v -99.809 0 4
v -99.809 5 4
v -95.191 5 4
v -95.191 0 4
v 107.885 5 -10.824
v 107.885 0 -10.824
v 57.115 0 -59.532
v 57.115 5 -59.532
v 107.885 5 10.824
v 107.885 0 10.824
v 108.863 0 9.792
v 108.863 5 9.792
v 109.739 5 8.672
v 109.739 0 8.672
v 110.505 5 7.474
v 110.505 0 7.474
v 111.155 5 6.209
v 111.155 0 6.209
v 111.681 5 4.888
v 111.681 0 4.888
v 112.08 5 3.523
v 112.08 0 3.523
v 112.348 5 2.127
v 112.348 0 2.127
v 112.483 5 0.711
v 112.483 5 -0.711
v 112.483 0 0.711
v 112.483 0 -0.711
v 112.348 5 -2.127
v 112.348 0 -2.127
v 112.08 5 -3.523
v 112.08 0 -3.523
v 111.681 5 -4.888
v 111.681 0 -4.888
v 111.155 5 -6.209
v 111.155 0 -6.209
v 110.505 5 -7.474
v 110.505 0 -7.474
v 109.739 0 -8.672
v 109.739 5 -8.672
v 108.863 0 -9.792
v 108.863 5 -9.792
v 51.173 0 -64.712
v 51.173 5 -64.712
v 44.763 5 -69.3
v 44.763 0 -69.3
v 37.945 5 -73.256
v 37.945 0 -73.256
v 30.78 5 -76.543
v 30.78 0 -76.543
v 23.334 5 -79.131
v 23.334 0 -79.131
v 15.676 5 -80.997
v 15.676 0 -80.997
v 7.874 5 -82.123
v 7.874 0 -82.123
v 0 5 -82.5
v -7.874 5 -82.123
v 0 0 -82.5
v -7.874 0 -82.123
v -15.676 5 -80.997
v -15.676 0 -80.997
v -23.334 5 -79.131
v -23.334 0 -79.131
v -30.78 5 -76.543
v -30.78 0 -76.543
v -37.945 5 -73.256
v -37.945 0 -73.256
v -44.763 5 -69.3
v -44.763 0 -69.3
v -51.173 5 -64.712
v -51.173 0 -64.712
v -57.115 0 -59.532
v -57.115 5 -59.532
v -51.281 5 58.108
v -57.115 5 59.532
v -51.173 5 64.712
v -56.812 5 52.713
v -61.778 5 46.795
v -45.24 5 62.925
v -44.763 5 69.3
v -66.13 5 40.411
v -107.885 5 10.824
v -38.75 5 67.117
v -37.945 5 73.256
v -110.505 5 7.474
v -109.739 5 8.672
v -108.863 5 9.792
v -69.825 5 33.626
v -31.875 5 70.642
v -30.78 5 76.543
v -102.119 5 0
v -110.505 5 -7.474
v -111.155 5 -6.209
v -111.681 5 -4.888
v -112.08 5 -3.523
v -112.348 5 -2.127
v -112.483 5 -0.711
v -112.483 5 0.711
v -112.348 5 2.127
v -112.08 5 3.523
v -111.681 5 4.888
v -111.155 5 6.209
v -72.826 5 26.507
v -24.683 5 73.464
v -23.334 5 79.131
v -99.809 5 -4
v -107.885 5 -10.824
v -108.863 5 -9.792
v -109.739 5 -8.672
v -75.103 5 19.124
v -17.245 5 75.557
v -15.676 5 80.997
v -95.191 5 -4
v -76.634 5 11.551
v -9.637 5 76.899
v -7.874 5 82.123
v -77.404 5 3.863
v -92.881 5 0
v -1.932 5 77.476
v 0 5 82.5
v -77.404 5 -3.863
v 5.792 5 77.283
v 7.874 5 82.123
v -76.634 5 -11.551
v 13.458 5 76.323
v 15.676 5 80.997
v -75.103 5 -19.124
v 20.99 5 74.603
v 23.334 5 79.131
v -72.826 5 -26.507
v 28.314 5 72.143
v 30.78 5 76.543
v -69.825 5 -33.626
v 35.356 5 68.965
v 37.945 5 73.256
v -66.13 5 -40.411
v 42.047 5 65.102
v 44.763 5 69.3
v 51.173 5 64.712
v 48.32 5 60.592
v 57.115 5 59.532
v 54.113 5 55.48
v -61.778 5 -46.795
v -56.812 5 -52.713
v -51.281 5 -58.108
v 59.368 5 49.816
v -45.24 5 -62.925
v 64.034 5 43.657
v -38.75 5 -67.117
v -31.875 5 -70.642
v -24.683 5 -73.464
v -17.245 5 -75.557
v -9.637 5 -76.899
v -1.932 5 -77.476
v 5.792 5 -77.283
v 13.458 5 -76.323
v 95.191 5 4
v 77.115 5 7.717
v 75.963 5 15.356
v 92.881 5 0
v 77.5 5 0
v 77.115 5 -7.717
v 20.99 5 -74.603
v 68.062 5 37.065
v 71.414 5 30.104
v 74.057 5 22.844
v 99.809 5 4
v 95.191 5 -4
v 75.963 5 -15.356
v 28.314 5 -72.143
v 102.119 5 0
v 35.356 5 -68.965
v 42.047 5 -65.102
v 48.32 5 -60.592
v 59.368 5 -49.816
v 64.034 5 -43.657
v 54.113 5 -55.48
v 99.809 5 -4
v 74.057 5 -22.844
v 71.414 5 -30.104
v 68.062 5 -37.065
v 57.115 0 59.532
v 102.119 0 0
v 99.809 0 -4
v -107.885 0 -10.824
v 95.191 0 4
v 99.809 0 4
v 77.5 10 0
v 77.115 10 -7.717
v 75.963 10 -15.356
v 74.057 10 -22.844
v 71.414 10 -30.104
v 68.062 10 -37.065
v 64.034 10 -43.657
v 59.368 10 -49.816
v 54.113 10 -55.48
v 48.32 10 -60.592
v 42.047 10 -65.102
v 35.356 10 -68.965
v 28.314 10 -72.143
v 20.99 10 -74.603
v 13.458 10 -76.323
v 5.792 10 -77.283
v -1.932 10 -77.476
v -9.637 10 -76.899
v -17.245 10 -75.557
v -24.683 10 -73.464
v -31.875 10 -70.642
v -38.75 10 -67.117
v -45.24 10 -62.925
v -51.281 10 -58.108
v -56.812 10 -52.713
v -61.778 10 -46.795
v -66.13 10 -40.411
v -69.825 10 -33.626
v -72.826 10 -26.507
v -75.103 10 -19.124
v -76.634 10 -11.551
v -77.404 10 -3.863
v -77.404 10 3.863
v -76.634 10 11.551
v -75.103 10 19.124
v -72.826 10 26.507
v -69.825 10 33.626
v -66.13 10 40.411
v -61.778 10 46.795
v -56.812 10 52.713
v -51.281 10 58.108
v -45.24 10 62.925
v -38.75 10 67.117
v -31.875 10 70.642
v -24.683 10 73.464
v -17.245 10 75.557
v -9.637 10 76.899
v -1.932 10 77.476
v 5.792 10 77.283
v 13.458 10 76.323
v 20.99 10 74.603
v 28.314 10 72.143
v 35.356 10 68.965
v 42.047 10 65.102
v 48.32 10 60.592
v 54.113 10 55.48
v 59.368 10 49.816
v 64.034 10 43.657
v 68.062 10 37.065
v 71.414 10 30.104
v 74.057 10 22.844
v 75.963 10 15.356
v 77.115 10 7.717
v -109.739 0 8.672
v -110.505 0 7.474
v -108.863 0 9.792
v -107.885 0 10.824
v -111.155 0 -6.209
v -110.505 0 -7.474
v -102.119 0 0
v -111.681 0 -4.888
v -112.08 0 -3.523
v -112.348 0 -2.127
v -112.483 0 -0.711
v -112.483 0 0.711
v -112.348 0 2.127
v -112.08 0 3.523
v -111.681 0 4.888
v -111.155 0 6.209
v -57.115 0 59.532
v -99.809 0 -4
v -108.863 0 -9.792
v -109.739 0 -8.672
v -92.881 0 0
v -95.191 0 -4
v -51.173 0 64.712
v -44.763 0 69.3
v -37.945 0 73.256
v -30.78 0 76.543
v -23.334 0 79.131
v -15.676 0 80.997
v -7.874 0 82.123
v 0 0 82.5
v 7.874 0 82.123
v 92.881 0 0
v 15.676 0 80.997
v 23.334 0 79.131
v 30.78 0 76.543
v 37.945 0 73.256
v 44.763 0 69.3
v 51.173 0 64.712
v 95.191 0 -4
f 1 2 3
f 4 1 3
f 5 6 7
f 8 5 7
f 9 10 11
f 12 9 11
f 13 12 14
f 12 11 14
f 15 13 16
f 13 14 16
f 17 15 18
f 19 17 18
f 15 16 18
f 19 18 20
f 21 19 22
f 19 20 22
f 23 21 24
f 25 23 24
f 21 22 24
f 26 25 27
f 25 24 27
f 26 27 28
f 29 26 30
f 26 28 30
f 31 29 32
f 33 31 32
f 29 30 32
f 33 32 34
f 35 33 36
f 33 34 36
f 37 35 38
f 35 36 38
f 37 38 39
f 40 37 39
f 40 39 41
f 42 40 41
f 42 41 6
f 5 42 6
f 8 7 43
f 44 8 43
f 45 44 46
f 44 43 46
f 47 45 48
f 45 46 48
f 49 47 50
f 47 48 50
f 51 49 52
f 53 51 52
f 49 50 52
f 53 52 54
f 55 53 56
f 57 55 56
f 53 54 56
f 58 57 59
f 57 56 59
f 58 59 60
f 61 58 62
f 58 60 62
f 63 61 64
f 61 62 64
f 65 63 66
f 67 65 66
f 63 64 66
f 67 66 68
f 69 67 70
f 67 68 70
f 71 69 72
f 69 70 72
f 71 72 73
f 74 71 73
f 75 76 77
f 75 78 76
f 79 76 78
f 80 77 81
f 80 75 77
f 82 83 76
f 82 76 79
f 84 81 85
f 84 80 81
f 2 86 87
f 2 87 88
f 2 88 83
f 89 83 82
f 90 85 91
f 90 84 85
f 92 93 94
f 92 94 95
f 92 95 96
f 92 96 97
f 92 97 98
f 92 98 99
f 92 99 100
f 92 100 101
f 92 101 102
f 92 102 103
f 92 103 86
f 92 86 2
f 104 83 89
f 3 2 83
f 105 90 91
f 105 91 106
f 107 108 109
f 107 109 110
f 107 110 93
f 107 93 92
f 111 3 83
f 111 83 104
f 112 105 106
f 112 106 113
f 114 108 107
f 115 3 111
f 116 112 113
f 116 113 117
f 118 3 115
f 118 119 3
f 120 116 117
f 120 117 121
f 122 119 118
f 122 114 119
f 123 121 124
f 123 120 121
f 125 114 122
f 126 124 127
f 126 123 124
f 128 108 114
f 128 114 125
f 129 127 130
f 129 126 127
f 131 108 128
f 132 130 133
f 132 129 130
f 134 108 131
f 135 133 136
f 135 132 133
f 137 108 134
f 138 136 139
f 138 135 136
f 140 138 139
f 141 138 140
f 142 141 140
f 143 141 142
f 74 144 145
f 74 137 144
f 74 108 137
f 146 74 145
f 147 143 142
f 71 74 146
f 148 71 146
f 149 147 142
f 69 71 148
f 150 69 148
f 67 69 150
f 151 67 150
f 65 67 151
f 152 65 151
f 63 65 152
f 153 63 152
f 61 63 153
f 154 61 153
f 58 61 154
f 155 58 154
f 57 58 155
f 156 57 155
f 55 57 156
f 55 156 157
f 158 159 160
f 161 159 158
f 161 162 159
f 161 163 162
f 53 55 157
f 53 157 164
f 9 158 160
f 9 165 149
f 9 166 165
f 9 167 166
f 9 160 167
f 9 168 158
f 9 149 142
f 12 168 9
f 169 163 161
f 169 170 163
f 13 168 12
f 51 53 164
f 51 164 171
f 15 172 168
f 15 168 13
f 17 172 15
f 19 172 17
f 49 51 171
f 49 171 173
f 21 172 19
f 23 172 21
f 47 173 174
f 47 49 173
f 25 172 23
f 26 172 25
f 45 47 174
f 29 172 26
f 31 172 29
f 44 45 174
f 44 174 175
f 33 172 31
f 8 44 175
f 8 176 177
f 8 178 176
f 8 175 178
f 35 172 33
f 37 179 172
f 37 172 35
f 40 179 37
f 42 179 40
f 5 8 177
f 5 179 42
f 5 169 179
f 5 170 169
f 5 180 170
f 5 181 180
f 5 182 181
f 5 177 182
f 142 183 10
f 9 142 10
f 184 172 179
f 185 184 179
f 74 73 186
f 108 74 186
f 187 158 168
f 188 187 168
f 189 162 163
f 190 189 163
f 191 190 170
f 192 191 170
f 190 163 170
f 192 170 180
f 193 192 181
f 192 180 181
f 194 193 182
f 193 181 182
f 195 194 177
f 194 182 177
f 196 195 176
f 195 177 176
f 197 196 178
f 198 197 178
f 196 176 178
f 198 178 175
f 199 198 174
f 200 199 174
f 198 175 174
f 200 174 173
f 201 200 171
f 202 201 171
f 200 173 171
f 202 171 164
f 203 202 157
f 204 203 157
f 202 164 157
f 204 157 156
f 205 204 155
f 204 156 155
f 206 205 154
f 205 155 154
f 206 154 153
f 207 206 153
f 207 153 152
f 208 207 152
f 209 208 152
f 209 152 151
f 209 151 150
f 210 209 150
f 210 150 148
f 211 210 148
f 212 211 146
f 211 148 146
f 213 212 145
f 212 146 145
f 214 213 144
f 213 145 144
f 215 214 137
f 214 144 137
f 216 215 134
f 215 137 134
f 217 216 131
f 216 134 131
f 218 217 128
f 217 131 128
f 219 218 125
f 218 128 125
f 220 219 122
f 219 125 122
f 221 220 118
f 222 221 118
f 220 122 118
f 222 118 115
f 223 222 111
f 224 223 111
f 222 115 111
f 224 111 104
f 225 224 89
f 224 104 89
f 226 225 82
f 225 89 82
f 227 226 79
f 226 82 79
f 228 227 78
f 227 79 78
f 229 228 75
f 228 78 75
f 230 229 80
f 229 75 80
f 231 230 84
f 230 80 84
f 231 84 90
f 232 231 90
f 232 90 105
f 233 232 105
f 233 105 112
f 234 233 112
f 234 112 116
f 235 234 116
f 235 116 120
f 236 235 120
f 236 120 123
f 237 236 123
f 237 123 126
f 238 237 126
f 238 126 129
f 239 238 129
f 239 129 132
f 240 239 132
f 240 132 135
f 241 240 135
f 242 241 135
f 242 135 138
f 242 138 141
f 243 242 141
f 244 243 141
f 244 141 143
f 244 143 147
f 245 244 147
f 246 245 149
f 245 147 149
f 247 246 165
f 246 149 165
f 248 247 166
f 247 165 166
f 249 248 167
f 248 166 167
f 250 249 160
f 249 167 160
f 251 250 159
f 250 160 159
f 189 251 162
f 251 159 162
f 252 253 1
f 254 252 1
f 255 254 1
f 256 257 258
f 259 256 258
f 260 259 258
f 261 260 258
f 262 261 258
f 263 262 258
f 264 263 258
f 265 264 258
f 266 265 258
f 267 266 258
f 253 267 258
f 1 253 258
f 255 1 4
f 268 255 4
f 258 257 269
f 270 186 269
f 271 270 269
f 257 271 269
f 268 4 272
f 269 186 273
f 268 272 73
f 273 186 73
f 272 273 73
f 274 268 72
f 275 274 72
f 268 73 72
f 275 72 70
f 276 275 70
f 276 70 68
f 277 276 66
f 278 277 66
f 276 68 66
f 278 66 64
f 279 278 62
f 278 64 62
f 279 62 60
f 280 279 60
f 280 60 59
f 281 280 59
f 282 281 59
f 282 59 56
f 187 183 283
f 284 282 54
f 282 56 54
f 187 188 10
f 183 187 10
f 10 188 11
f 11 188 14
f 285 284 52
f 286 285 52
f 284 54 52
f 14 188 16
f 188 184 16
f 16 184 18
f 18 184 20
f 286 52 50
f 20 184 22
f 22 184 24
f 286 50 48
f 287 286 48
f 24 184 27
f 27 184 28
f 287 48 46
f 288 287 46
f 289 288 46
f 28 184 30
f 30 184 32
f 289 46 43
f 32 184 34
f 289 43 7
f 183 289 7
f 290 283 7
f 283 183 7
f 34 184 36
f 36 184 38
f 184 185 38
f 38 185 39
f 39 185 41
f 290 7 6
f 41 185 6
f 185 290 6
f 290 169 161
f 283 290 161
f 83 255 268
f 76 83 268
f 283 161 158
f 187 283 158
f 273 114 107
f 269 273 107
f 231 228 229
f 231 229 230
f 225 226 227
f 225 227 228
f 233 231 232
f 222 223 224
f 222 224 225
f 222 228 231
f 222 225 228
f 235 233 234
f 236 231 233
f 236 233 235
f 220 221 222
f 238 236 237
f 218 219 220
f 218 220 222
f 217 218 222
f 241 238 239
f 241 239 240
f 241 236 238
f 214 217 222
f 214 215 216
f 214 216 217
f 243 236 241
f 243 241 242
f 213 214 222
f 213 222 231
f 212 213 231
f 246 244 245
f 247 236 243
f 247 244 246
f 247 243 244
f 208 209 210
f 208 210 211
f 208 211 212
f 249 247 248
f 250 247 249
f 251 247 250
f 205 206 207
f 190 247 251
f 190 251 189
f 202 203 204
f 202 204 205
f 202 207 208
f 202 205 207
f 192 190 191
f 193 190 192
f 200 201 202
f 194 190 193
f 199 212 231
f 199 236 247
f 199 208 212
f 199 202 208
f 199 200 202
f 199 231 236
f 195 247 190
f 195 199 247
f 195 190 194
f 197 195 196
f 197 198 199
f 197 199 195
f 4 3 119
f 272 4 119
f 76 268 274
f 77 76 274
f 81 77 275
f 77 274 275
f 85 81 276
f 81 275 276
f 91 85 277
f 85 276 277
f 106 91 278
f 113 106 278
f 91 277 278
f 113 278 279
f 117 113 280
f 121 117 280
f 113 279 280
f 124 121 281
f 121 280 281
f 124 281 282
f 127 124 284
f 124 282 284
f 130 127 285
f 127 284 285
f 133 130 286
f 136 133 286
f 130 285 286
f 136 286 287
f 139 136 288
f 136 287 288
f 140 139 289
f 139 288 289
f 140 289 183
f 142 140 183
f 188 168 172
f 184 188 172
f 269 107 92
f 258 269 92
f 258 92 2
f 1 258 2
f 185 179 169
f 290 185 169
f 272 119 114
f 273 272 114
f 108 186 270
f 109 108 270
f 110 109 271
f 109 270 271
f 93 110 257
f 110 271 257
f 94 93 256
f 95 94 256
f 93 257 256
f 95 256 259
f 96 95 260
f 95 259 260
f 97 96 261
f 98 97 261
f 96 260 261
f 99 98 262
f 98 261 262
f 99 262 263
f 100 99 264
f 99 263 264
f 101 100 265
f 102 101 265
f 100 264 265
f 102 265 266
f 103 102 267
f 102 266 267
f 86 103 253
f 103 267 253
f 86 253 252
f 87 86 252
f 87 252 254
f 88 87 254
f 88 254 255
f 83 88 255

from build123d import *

# Parameters (mm, degrees)
BOSS_EXTRUDE1_DEPTH = 5
SKETCH2_R           = 77.5
BOSS_EXTRUDE2_DEPTH = 5
CUT_EXTRUDE1_DEPTH  = 6


with BuildPart() as part:
    # Sketch1 → Boss-Extrude1 (new body)
    with BuildSketch(Plane(origin=(0, 0, 0), x_dir=(1, 0, 0), z_dir=(0, 1, 0))):
        with BuildLine():
            Line((107.884615385, 10.824036369), (57.115384615, 59.532200029))
            ThreePointArc((57.115384615, 59.532200029), (0, 82.5), (-57.115384615, 59.532200029))
            Line((-57.115384615, 59.532200029), (-107.884615385, 10.824036369))
            ThreePointArc((-107.884615385, 10.824036369), (-112.5, 0), (-107.884615385, -10.824036369))
            Line((-107.884615385, -10.824036369), (-57.115384615, -59.532200029))
            ThreePointArc((-57.115384615, -59.532200029), (0, -82.5), (57.115384615, -59.532200029))
            Line((57.115384615, -59.532200029), (107.884615385, -10.824036369))
            ThreePointArc((107.884615385, -10.824036369), (112.5, 0), (107.884615385, 10.824036369))
        make_face()
    extrude(amount=BOSS_EXTRUDE1_DEPTH)

    # Sketch2 → Boss-Extrude2 (add)
    with BuildSketch(Plane(origin=(0, 5, 0), x_dir=(1, 0, 0), z_dir=(0, 1, 0))):
        Circle(SKETCH2_R)
    extrude(amount=BOSS_EXTRUDE2_DEPTH)

    # Sketch3 → Cut-Extrude1 (cut, through all)
    with BuildSketch(Plane(origin=(0, 5, 0), x_dir=(1, 0, 0), z_dir=(0, 1, 0))):
        Polygon((-95.190598923, 4), (-99.809401077, 4), (-102.118802154, 0), (-99.809401077, -4), (-95.190598923, -4), (-92.881197846, 0), align=None)
        Polygon((99.809401077, 4), (95.190598923, 4), (92.881197846, 0), (95.190598923, -4), (99.809401077, -4), (102.118802154, 0), align=None)
    extrude(amount=-CUT_EXTRUDE1_DEPTH, mode=Mode.SUBTRACT)


solid = part.part
